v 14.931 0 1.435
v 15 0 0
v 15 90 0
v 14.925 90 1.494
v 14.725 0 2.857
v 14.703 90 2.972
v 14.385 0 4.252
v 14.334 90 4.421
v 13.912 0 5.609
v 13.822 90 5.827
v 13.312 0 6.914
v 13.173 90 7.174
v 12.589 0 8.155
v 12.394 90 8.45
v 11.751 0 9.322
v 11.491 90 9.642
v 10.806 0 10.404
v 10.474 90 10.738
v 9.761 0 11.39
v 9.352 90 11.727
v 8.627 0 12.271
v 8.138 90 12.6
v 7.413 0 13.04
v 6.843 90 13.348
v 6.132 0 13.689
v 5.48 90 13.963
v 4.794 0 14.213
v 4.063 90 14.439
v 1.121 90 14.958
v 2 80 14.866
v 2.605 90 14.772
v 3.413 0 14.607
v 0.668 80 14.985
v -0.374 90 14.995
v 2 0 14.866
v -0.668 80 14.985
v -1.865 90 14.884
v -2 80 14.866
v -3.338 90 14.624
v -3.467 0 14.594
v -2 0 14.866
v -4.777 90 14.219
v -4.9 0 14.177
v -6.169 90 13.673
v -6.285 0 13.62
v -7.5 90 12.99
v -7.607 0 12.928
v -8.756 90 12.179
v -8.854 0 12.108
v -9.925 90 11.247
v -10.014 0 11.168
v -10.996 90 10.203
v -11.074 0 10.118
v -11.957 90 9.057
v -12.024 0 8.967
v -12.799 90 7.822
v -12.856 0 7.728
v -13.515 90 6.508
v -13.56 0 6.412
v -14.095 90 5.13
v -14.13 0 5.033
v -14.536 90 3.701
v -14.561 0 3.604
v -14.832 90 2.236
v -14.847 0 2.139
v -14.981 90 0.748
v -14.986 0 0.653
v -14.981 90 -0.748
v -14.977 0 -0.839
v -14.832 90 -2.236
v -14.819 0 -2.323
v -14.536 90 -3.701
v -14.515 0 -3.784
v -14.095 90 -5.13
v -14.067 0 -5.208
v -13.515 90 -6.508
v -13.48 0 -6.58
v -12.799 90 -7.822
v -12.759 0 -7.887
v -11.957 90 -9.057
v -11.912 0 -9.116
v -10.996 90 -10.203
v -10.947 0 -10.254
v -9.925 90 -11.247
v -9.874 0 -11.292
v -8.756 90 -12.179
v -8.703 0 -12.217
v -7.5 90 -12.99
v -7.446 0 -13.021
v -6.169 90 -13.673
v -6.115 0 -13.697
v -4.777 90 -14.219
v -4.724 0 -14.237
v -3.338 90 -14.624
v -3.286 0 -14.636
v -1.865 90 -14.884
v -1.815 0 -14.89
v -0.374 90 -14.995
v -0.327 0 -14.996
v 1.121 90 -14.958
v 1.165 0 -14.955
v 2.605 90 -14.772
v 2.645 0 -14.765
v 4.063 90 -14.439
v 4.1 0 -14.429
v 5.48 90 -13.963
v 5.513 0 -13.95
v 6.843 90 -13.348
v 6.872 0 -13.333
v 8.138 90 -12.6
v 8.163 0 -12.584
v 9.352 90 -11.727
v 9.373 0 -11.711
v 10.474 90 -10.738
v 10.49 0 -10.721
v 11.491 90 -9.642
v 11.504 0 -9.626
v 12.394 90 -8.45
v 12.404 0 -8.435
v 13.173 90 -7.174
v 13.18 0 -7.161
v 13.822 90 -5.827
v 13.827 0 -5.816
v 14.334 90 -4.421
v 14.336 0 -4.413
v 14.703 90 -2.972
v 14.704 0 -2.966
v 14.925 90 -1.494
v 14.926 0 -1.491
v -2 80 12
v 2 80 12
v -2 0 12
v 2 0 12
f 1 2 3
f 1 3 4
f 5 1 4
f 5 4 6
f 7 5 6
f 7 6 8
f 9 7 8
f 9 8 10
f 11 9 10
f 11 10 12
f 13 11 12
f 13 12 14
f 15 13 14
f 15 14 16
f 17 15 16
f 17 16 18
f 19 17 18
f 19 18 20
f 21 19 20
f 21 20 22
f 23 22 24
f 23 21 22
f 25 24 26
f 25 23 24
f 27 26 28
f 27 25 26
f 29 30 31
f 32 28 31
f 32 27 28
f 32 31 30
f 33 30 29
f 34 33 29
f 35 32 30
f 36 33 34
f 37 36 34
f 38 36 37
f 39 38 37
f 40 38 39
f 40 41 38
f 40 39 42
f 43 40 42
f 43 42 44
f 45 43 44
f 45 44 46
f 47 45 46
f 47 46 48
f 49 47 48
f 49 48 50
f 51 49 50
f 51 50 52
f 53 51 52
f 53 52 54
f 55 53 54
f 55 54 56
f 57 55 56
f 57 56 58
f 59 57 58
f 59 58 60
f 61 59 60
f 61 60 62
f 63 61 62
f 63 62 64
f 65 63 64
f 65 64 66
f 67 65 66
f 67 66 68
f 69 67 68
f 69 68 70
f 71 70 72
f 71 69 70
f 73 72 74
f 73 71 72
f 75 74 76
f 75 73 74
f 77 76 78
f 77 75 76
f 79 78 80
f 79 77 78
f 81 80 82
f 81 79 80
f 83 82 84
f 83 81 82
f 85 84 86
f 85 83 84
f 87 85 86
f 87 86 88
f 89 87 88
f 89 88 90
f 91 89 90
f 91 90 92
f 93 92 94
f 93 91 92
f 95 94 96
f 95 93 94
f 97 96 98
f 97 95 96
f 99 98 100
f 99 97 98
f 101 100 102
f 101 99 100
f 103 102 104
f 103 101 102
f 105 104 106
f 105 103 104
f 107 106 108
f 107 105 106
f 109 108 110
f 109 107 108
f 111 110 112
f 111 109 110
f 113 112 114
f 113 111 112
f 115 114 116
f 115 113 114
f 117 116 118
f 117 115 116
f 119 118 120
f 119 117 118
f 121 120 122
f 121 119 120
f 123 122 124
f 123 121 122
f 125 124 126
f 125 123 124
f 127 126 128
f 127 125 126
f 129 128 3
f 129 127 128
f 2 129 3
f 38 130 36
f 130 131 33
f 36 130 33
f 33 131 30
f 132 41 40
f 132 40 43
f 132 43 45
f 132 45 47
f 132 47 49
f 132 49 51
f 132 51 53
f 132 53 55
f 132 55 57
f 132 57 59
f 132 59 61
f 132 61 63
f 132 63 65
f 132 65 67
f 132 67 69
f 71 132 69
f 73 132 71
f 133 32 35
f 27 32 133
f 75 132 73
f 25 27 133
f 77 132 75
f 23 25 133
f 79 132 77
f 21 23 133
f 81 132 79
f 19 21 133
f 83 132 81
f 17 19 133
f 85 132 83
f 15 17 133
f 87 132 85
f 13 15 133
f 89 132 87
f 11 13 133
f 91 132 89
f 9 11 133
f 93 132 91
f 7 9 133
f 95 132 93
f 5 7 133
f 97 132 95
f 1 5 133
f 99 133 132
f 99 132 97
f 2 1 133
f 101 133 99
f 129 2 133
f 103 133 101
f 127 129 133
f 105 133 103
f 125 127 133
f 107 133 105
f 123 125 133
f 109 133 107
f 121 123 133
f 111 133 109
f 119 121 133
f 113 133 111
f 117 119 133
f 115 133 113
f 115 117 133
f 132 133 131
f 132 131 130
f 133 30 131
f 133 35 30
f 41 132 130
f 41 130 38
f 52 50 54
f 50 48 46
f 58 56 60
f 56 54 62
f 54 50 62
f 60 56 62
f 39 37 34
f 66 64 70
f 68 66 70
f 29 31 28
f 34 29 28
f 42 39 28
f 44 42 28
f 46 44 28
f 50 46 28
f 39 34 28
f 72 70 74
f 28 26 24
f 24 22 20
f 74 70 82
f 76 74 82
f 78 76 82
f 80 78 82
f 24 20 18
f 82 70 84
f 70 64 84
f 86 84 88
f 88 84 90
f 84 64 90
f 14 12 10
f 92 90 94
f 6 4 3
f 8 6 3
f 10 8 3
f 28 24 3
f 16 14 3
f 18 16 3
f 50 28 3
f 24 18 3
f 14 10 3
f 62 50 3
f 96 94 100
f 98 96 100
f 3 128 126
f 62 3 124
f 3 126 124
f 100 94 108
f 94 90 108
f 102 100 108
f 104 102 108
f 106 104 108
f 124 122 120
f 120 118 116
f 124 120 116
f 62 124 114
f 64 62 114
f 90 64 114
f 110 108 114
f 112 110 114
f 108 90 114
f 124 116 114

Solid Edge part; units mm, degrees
sketch "Sketch1" plane through (0, 0, 0) normal (0, -1, 0) x (1, 0, 0)
  circle A0 centre (0, 0) radius 15
extrude "Protrusion1" add sketch "Sketch1" against normal blind 90
sketch "Sketch2" plane through (0, 0, 0) normal (0, -1, 0) x (1, 0, 0)
  line L0 (-2, 16.5083) -> (2, 16.5083)
  line L1 (2, 16.5083) -> (2, 12)
  line L2 (2, 12) -> (-2, 12)
  line L3 (-2, 12) -> (-2, 16.5083)
  dimension "D1" = 4
  dimension "D2" = 3
extrude "ExtrudedCutout_1" cut sketch "Sketch2" against normal blind 80
properties part number "1"
